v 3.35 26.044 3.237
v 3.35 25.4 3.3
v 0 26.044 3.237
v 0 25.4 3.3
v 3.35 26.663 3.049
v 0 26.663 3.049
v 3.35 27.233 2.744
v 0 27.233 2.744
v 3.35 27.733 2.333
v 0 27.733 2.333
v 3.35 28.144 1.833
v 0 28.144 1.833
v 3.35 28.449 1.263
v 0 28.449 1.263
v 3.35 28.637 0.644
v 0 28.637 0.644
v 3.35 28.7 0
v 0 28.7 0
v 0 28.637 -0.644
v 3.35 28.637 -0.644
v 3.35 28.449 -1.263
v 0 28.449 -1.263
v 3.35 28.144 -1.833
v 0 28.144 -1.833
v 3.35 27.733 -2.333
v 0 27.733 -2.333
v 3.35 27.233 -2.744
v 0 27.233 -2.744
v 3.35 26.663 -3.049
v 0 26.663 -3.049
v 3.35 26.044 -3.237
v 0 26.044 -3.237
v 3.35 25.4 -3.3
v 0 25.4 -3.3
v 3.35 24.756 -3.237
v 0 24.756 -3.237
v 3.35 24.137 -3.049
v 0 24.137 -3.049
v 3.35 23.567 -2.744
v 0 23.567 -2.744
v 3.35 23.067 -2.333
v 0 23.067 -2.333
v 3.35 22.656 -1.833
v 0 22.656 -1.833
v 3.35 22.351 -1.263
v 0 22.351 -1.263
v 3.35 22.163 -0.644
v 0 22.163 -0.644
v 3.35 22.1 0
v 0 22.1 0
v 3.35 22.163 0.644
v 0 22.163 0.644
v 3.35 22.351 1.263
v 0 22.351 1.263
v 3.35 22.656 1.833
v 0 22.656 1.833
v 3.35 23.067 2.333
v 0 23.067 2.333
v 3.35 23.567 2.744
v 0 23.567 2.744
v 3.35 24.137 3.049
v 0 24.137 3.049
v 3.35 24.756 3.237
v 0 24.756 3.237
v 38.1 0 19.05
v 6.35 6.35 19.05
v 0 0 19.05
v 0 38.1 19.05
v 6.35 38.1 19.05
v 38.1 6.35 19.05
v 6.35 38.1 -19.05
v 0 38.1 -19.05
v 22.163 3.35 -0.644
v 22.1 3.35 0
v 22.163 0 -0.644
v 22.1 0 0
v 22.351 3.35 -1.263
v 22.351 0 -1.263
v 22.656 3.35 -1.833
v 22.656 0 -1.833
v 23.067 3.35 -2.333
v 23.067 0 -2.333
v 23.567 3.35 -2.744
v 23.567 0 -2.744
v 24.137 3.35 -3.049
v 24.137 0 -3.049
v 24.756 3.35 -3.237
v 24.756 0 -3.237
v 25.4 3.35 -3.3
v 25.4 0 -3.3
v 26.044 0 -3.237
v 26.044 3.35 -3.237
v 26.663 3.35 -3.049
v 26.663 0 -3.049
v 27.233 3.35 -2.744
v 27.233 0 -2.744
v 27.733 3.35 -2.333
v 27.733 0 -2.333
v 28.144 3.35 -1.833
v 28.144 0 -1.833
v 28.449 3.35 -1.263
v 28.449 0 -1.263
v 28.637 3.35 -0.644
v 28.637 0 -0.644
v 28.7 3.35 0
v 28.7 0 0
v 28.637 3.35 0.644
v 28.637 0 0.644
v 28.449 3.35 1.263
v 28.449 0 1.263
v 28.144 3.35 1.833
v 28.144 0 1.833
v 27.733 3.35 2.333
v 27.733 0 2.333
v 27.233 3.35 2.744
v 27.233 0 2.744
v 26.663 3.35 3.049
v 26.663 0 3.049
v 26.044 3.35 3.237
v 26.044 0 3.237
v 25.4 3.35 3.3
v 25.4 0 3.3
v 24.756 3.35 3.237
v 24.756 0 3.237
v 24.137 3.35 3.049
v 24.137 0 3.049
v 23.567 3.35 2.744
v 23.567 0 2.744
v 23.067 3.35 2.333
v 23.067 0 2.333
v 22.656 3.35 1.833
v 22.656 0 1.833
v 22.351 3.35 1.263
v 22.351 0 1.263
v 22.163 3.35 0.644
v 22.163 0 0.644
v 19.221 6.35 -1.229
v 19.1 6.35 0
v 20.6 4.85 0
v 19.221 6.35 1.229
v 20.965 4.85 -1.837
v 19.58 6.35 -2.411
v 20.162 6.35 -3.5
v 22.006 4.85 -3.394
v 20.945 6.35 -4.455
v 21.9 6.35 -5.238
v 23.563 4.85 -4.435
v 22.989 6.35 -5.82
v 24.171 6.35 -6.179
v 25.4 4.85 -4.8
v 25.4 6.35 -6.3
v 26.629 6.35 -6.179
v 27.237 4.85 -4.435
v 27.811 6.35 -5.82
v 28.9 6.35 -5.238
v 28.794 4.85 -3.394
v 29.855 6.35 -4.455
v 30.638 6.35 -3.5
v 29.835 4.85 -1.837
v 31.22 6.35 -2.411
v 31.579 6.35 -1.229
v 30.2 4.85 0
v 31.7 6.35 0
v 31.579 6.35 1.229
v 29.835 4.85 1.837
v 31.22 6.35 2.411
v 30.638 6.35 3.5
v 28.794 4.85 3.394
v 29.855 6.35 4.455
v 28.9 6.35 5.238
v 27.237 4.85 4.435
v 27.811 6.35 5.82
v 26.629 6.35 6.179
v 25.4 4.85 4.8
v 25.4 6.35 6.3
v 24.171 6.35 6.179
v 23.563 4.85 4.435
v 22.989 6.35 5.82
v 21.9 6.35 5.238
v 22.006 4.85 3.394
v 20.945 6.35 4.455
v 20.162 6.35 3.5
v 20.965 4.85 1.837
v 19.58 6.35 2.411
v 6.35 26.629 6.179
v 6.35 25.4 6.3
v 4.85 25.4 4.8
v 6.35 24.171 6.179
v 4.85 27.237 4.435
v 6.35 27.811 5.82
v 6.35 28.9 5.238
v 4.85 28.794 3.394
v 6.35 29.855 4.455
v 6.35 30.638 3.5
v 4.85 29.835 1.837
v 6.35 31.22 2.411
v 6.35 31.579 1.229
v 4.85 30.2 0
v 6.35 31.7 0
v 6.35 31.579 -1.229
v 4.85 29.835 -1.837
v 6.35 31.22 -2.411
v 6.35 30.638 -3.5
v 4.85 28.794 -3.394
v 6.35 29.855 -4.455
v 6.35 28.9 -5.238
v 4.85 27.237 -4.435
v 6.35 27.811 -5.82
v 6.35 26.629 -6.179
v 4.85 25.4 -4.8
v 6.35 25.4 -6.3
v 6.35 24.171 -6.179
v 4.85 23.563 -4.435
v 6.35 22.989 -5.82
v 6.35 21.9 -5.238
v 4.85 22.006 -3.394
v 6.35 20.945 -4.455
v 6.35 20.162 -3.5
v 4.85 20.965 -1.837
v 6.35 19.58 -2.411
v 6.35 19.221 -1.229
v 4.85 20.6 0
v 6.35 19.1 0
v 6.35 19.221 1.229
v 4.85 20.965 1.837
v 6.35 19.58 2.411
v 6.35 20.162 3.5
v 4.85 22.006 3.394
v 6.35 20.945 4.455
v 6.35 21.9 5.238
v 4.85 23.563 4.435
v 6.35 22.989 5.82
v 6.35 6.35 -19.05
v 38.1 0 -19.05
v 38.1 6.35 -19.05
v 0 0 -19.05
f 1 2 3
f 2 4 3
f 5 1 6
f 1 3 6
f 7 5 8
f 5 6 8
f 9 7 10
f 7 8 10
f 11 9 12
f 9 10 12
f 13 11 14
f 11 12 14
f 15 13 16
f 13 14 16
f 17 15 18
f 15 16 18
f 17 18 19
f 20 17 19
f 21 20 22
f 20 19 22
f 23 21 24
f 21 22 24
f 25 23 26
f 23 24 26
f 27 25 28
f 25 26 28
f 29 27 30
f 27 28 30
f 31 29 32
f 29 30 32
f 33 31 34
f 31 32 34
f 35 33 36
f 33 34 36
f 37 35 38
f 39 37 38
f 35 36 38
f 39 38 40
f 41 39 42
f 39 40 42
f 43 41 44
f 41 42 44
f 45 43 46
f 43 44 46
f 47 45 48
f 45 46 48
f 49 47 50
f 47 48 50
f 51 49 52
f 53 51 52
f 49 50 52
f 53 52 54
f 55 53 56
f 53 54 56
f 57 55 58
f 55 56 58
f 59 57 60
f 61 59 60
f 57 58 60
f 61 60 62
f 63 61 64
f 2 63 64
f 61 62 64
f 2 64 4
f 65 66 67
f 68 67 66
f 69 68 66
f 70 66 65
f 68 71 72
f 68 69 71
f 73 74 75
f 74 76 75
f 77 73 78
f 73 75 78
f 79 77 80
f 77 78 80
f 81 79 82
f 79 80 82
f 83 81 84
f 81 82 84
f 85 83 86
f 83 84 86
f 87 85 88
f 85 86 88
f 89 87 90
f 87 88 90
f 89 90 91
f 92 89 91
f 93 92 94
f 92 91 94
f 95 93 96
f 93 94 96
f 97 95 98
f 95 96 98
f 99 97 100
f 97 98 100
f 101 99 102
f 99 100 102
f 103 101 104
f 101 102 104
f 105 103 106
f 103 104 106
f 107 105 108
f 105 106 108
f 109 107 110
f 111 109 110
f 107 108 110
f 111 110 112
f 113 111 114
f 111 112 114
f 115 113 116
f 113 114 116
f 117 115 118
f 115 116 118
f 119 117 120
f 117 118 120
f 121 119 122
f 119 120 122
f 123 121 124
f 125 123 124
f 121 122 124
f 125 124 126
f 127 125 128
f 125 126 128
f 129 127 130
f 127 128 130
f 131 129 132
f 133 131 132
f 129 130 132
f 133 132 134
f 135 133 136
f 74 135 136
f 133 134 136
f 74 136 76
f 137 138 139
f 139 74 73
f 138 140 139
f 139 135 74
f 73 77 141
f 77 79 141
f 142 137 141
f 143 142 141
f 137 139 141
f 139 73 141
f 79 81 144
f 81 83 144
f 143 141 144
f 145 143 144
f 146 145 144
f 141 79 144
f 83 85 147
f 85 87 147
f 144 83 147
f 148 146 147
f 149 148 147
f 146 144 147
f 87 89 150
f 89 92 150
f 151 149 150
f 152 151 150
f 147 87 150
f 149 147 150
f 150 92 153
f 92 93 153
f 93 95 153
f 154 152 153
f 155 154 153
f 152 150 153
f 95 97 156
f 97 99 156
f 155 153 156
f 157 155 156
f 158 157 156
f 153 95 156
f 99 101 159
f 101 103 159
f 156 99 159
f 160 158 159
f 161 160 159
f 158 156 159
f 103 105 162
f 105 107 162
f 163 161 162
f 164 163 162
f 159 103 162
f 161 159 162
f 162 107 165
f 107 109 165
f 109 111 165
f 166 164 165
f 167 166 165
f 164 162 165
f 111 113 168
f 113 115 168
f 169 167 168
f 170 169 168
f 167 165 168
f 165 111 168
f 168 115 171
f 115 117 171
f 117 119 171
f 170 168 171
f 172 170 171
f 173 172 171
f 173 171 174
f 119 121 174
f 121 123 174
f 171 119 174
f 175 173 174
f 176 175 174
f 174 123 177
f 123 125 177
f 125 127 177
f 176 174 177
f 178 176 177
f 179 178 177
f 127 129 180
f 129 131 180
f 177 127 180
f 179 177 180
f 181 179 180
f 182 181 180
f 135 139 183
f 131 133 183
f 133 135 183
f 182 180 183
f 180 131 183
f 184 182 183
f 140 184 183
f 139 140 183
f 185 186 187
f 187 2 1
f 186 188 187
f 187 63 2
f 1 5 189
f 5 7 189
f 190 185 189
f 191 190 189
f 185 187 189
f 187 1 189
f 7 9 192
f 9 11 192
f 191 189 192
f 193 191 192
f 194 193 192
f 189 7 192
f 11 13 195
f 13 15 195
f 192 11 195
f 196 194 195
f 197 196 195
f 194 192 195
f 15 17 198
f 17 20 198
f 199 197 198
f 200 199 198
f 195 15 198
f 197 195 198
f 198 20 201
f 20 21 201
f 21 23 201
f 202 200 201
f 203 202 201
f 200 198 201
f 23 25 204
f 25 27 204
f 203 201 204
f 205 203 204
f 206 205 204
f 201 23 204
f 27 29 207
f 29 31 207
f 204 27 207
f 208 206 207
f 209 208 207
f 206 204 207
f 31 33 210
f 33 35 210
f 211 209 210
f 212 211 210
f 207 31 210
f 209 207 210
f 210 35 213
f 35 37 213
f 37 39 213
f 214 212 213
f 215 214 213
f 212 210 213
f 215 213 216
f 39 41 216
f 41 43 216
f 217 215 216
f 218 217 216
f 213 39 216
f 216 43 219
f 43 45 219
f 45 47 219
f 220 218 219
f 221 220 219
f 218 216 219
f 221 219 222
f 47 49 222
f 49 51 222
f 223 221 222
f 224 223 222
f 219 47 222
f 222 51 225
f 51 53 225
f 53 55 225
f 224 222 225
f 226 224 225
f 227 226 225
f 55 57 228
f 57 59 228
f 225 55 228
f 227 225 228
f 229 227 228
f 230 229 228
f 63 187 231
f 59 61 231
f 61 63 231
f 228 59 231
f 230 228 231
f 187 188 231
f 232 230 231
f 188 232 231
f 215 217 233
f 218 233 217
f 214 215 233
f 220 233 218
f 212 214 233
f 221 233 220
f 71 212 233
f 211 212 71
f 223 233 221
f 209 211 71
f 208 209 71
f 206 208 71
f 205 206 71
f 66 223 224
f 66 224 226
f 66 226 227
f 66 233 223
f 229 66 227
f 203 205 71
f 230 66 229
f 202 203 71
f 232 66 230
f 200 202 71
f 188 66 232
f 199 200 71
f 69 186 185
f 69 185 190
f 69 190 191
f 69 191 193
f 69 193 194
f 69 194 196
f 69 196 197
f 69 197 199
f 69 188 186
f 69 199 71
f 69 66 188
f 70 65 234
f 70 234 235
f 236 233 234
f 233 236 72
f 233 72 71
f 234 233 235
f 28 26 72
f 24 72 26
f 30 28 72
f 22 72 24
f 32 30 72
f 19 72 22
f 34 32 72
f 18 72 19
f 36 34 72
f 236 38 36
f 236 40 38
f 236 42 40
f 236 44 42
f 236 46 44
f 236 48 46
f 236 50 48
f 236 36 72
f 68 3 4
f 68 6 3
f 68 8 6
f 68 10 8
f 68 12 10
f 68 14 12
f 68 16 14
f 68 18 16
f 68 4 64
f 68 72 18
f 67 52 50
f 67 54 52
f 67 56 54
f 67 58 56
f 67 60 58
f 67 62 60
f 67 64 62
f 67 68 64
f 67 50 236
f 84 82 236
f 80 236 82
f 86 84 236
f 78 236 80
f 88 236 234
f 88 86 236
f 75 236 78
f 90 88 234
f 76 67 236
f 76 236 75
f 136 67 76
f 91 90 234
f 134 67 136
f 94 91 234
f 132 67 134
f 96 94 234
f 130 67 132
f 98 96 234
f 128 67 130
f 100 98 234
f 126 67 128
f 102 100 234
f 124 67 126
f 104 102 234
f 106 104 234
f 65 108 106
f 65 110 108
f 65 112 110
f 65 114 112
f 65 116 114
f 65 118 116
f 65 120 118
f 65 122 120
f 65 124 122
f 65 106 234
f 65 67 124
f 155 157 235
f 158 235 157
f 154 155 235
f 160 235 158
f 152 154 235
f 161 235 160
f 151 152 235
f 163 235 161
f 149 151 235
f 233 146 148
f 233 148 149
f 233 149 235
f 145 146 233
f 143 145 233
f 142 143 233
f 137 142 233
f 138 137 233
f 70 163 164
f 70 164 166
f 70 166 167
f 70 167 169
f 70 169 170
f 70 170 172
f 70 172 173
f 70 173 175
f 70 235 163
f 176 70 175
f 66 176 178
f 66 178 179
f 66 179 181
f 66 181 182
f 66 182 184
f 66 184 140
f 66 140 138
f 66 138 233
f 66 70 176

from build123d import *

# Parameters (mm, degrees)
BOSS_EXTRUDE1_DEPTH                             = 19.05
CSK_FOR_M6_FLAT_HEAD_MACHINE_SCREW1_D           = 6.6
CSK_FOR_M6_FLAT_HEAD_MACHINE_SCREW1_CSINK_D     = 12.6
CSK_FOR_M6_FLAT_HEAD_MACHINE_SCREW1_CSINK_ANGLE = 90
CSK_FOR_M6_FLAT_HEAD_MACHINE_SCREW2_D           = 6.6
CSK_FOR_M6_FLAT_HEAD_MACHINE_SCREW2_CSINK_D     = 12.6
CSK_FOR_M6_FLAT_HEAD_MACHINE_SCREW2_CSINK_ANGLE = 90


with BuildPart() as part:
    # Sketch1 → Boss-Extrude1 (new, symmetric)
    with BuildSketch(Plane.XY):
        Polygon((0, 4.567772054), (0, 0), (4.567772054, 0), (38.1, 0), (38.1, 6.35), (6.35, 6.35), (6.35, 38.1), (0, 38.1), align=None)
    extrude(amount=BOSS_EXTRUDE1_DEPTH, both=True)

    # CSK for M6 Flat Head Machine Screw1 (through all)
    with Locations(Plane(origin=(6.35, 0, 0), x_dir=(0, 0, -1), z_dir=(1, 0, 0))):
        with Locations((0, 25.4)):
            CounterSinkHole(CSK_FOR_M6_FLAT_HEAD_MACHINE_SCREW1_D / 2, CSK_FOR_M6_FLAT_HEAD_MACHINE_SCREW1_CSINK_D / 2, counter_sink_angle=CSK_FOR_M6_FLAT_HEAD_MACHINE_SCREW1_CSINK_ANGLE)

    # CSK for M6 Flat Head Machine Screw2 (through all)
    with Locations(Plane(origin=(0, 6.35, 0), x_dir=(1, 0, 0), z_dir=(0, 1, 0))):
        with Locations((25.4, 0)):
            CounterSinkHole(CSK_FOR_M6_FLAT_HEAD_MACHINE_SCREW2_D / 2, CSK_FOR_M6_FLAT_HEAD_MACHINE_SCREW2_CSINK_D / 2, counter_sink_angle=CSK_FOR_M6_FLAT_HEAD_MACHINE_SCREW2_CSINK_ANGLE)


solid = part.part
